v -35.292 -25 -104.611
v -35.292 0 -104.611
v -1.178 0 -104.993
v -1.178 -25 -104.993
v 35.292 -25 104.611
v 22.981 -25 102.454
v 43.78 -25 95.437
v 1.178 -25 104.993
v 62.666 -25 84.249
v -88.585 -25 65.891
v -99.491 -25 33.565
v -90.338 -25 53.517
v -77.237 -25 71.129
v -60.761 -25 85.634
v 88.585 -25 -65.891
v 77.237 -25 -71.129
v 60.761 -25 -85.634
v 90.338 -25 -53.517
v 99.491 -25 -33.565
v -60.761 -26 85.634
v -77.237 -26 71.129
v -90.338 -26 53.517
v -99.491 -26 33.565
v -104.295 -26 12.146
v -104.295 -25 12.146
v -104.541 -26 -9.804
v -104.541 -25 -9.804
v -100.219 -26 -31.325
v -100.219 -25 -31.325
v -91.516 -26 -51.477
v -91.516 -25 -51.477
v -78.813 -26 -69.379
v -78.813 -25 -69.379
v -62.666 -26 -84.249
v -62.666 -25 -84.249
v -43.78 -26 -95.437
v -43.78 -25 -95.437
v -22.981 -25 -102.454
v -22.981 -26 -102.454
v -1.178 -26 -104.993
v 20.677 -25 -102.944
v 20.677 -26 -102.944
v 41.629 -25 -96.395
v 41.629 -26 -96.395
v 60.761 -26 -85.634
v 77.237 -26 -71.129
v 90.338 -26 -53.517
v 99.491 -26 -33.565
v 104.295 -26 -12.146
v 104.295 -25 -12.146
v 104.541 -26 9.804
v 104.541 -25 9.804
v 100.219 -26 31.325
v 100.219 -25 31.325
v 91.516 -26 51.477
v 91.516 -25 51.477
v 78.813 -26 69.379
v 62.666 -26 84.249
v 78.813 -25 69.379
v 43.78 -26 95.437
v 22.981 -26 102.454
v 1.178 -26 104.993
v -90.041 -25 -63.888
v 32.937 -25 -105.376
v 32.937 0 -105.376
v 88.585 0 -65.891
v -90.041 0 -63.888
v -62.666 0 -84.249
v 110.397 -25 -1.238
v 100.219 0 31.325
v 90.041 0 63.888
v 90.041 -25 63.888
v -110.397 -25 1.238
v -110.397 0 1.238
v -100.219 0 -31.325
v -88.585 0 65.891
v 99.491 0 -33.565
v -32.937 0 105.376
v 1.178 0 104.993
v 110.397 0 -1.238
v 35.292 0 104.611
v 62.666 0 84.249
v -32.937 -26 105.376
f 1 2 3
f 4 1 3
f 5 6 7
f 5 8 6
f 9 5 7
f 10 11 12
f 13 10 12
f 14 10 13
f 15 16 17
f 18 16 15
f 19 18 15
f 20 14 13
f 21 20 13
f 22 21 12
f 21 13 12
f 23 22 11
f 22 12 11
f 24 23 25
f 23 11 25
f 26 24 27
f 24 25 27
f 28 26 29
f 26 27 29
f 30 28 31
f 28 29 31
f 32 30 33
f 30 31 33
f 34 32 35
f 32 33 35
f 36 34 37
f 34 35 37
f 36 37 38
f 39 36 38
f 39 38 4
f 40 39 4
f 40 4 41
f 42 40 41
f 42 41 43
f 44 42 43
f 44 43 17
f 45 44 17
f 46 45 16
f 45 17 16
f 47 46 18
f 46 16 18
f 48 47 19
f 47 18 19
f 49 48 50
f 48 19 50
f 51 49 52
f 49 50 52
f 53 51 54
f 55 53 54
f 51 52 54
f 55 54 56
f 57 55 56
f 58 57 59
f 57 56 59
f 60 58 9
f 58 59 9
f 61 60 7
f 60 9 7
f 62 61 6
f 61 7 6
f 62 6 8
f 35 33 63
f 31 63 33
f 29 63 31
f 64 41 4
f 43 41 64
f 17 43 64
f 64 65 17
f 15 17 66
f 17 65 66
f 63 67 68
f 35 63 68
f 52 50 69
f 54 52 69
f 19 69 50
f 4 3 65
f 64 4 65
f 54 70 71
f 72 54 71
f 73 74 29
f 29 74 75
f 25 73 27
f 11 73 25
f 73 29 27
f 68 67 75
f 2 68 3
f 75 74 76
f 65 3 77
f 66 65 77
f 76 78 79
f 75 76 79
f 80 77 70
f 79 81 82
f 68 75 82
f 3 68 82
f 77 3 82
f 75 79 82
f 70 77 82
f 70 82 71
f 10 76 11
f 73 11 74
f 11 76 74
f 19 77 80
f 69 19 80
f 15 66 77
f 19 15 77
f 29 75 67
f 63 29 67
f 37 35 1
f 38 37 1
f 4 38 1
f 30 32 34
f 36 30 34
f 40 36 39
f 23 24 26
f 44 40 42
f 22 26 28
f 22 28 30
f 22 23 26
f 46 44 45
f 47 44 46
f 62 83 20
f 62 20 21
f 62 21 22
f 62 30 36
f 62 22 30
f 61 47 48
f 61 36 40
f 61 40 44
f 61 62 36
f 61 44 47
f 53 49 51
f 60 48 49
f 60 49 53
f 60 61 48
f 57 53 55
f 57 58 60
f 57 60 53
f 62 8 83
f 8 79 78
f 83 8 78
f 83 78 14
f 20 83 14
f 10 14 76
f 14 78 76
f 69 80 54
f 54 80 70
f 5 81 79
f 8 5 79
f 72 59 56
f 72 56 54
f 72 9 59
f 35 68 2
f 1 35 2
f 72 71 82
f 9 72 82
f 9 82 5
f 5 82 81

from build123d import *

# Parameters (mm, degrees)
F1_DEPTH = 1
F2_DEPTH = 25


with BuildPart() as f1:
    # F0 (on Front) → F1 (new body)
    with BuildSketch(Plane.XZ):
        with BuildLine():
            ThreePointArc((99.4907408065, -33.5647507629), (103.6135314153, -17.0069429252), (105, 0))
            ThreePointArc((105, 0), (103.7977584549, 15.8437792124), (100.2185649575, 31.3247384325))
            ThreePointArc((100.2185649575, 31.3247384325), (85.6336425012, 60.7608366629), (62.6663022671, 84.2492407097))
            ThreePointArc((62.6663022671, 84.2492407097), (33.5647485771, 99.4907415439), (1.1776435614, 104.9933957716))
            ThreePointArc((1.1776435614, 104.9933957716), (-31.3247392722, 100.218564695), (-60.7608381292, 85.6336414608))
            ThreePointArc((-60.7608381292, 85.6336414608), (-84.2492404255, 62.6663026493), (-99.4907409959, 33.5647502014))
            ThreePointArc((-99.4907409959, 33.5647502014), (-104.9933957718, 1.1776435403), (-100.2185647541, -31.3247390832))
            ThreePointArc((-100.2185647541, -31.3247390832), (-85.6336424849, -60.7608366859), (-62.6663027691, -84.2492403363))
            ThreePointArc((-62.6663027691, -84.2492403363), (-33.5647485613, -99.4907415492), (-1.1776429024, -104.9933957789))
            ThreePointArc((-1.1776429024, -104.9933957789), (31.3247396024, -100.2185645918), (60.7608381561, -85.6336414417))
            ThreePointArc((60.7608381561, -85.6336414417), (84.2492402585, -62.6663028738), (99.4907408065, -33.5647507629))
        make_face()
        with BuildLine():
            ThreePointArc((-60.7608381292, 85.6336414608), (-31.3247392722, 100.218564695), (1.1776435614, 104.9933957716))
            Line((1.1776435614, 104.9933957716), (-32.9367799888, 105.3760349567))
            Line((-32.9367799888, 105.3760349567), (-60.7608381292, 85.6336414608))
        make_face()
    extrude(amount=F1_DEPTH)

    # F0 (on Front) + F1_face (on face) → F2 (join)
    with BuildSketch(Plane.XZ):
        with BuildLine():
            ThreePointArc((99.4907408065, -33.5647507629), (103.6135314153, -17.0069429252), (105, 0))
            ThreePointArc((105, 0), (103.7977584549, 15.8437792124), (100.2185649575, 31.3247384325))
            ThreePointArc((100.2185649575, 31.3247384325), (85.6336425012, 60.7608366629), (62.6663022671, 84.2492407097))
            ThreePointArc((62.6663022671, 84.2492407097), (33.5647485771, 99.4907415439), (1.1776435614, 104.9933957716))
            ThreePointArc((1.1776435614, 104.9933957716), (-31.3247392722, 100.218564695), (-60.7608381292, 85.6336414608))
            ThreePointArc((-60.7608381292, 85.6336414608), (-84.2492404255, 62.6663026493), (-99.4907409959, 33.5647502014))
            ThreePointArc((-99.4907409959, 33.5647502014), (-104.9933957718, 1.1776435403), (-100.2185647541, -31.3247390832))
            ThreePointArc((-100.2185647541, -31.3247390832), (-85.6336424849, -60.7608366859), (-62.6663027691, -84.2492403363))
            ThreePointArc((-62.6663027691, -84.2492403363), (-33.5647485613, -99.4907415492), (-1.1776429024, -104.9933957789))
            ThreePointArc((-1.1776429024, -104.9933957789), (31.3247396024, -100.2185645918), (60.7608381561, -85.6336414417))
            ThreePointArc((60.7608381561, -85.6336414417), (84.2492402585, -62.6663028738), (99.4907408065, -33.5647507629))
        make_face()
        with BuildLine():
            ThreePointArc((100.2185649575, 31.3247384325), (103.7977584549, 15.8437792124), (105, 0))
            ThreePointArc((105, 0), (103.6135314153, -17.0069429252), (99.4907408065, -33.5647507629))
            Line((99.4907408065, -33.5647507629), (110.3965894634, -1.2382463674))
            Line((110.3965894634, -1.2382463674), (100.2185649575, 31.3247384325))
        make_face()
        with BuildLine():
            ThreePointArc((62.6663022671, 84.2492407097), (85.6336425012, 60.7608366629), (100.2185649575, 31.3247384325))
            Line((100.2185649575, 31.3247384325), (90.0405399504, 63.8877248356))
            Line((90.0405399504, 63.8877248356), (62.6663022671, 84.2492407097))
        make_face()
        with BuildLine():
            Line((88.5848940435, -65.8912495444), (99.4907408065, -33.5647507629))
            ThreePointArc((99.4907408065, -33.5647507629), (84.2492402585, -62.6663028738), (60.7608381561, -85.6336414417))
            Line((60.7608381561, -85.6336414417), (88.5848940435, -65.8912495444))
        make_face()
        with BuildLine():
            ThreePointArc((1.1776435614, 104.9933957716), (33.5647485771, 99.4907415439), (62.6663022671, 84.2492407097))
            Line((62.6663022671, 84.2492407097), (35.2920645417, 104.6107566152))
            Line((35.2920645417, 104.6107566152), (1.1776435614, 104.9933957716))
        make_face()
        with BuildLine():
            Line((32.9367799888, -105.3760349567), (60.7608381561, -85.6336414417))
            ThreePointArc((60.7608381561, -85.6336414417), (31.3247396024, -100.2185645918), (-1.1776429024, -104.9933957789))
            Line((-1.1776429024, -104.9933957789), (32.9367799888, -105.3760349567))
        make_face()
        with BuildLine():
            ThreePointArc((-60.7608381292, 85.6336414608), (-31.3247392722, 100.218564695), (1.1776435614, 104.9933957716))
            Line((1.1776435614, 104.9933957716), (-32.9367799888, 105.3760349567))
            Line((-32.9367799888, 105.3760349567), (-60.7608381292, 85.6336414608))
        make_face()
        with BuildLine():
            Line((-35.2920645417, -104.6107566152), (-1.1776429024, -104.9933957789))
            ThreePointArc((-1.1776429024, -104.9933957789), (-33.5647485613, -99.4907415492), (-62.6663027691, -84.2492403363))
            Line((-62.6663027691, -84.2492403363), (-35.2920645417, -104.6107566152))
        make_face()
        with BuildLine():
            ThreePointArc((-99.4907409959, 33.5647502014), (-84.2492404255, 62.6663026493), (-60.7608381292, 85.6336414608))
            Line((-60.7608381292, 85.6336414608), (-88.5848940435, 65.8912495444))
            Line((-88.5848940435, 65.8912495444), (-99.4907409959, 33.5647502014))
        make_face()
        with BuildLine():
            Line((-90.0405399504, -63.8877248356), (-62.6663027691, -84.2492403363))
            ThreePointArc((-62.6663027691, -84.2492403363), (-85.6336424849, -60.7608366859), (-100.2185647541, -31.3247390832))
            Line((-100.2185647541, -31.3247390832), (-90.0405399504, -63.8877248356))
        make_face()
        with BuildLine():
            ThreePointArc((-100.2185647541, -31.3247390832), (-104.9933957718, 1.1776435403), (-99.4907409959, 33.5647502014))
            Line((-99.4907409959, 33.5647502014), (-110.3965894634, 1.2382463674))
            Line((-110.3965894634, 1.2382463674), (-100.2185647541, -31.3247390832))
        make_face()
    with BuildSketch(Plane(origin=(-0.1080602071, -1, 0.3457215964), x_dir=(1, 0, 0), z_dir=(0, -1, 0))):
        with BuildLine():
            Line((1.2857037684, 104.6476741752), (-32.8287197817, 105.0303133603))
            Line((-32.8287197817, 105.0303133603), (-60.6527779221, 85.2879198644))
            ThreePointArc((-60.6527779221, 85.2879198644), (31.4327994792, -100.5642862914), (1.2857037684, 104.6476741752))
        make_face()
    extrude(amount=F2_DEPTH)


solid = f1.part
